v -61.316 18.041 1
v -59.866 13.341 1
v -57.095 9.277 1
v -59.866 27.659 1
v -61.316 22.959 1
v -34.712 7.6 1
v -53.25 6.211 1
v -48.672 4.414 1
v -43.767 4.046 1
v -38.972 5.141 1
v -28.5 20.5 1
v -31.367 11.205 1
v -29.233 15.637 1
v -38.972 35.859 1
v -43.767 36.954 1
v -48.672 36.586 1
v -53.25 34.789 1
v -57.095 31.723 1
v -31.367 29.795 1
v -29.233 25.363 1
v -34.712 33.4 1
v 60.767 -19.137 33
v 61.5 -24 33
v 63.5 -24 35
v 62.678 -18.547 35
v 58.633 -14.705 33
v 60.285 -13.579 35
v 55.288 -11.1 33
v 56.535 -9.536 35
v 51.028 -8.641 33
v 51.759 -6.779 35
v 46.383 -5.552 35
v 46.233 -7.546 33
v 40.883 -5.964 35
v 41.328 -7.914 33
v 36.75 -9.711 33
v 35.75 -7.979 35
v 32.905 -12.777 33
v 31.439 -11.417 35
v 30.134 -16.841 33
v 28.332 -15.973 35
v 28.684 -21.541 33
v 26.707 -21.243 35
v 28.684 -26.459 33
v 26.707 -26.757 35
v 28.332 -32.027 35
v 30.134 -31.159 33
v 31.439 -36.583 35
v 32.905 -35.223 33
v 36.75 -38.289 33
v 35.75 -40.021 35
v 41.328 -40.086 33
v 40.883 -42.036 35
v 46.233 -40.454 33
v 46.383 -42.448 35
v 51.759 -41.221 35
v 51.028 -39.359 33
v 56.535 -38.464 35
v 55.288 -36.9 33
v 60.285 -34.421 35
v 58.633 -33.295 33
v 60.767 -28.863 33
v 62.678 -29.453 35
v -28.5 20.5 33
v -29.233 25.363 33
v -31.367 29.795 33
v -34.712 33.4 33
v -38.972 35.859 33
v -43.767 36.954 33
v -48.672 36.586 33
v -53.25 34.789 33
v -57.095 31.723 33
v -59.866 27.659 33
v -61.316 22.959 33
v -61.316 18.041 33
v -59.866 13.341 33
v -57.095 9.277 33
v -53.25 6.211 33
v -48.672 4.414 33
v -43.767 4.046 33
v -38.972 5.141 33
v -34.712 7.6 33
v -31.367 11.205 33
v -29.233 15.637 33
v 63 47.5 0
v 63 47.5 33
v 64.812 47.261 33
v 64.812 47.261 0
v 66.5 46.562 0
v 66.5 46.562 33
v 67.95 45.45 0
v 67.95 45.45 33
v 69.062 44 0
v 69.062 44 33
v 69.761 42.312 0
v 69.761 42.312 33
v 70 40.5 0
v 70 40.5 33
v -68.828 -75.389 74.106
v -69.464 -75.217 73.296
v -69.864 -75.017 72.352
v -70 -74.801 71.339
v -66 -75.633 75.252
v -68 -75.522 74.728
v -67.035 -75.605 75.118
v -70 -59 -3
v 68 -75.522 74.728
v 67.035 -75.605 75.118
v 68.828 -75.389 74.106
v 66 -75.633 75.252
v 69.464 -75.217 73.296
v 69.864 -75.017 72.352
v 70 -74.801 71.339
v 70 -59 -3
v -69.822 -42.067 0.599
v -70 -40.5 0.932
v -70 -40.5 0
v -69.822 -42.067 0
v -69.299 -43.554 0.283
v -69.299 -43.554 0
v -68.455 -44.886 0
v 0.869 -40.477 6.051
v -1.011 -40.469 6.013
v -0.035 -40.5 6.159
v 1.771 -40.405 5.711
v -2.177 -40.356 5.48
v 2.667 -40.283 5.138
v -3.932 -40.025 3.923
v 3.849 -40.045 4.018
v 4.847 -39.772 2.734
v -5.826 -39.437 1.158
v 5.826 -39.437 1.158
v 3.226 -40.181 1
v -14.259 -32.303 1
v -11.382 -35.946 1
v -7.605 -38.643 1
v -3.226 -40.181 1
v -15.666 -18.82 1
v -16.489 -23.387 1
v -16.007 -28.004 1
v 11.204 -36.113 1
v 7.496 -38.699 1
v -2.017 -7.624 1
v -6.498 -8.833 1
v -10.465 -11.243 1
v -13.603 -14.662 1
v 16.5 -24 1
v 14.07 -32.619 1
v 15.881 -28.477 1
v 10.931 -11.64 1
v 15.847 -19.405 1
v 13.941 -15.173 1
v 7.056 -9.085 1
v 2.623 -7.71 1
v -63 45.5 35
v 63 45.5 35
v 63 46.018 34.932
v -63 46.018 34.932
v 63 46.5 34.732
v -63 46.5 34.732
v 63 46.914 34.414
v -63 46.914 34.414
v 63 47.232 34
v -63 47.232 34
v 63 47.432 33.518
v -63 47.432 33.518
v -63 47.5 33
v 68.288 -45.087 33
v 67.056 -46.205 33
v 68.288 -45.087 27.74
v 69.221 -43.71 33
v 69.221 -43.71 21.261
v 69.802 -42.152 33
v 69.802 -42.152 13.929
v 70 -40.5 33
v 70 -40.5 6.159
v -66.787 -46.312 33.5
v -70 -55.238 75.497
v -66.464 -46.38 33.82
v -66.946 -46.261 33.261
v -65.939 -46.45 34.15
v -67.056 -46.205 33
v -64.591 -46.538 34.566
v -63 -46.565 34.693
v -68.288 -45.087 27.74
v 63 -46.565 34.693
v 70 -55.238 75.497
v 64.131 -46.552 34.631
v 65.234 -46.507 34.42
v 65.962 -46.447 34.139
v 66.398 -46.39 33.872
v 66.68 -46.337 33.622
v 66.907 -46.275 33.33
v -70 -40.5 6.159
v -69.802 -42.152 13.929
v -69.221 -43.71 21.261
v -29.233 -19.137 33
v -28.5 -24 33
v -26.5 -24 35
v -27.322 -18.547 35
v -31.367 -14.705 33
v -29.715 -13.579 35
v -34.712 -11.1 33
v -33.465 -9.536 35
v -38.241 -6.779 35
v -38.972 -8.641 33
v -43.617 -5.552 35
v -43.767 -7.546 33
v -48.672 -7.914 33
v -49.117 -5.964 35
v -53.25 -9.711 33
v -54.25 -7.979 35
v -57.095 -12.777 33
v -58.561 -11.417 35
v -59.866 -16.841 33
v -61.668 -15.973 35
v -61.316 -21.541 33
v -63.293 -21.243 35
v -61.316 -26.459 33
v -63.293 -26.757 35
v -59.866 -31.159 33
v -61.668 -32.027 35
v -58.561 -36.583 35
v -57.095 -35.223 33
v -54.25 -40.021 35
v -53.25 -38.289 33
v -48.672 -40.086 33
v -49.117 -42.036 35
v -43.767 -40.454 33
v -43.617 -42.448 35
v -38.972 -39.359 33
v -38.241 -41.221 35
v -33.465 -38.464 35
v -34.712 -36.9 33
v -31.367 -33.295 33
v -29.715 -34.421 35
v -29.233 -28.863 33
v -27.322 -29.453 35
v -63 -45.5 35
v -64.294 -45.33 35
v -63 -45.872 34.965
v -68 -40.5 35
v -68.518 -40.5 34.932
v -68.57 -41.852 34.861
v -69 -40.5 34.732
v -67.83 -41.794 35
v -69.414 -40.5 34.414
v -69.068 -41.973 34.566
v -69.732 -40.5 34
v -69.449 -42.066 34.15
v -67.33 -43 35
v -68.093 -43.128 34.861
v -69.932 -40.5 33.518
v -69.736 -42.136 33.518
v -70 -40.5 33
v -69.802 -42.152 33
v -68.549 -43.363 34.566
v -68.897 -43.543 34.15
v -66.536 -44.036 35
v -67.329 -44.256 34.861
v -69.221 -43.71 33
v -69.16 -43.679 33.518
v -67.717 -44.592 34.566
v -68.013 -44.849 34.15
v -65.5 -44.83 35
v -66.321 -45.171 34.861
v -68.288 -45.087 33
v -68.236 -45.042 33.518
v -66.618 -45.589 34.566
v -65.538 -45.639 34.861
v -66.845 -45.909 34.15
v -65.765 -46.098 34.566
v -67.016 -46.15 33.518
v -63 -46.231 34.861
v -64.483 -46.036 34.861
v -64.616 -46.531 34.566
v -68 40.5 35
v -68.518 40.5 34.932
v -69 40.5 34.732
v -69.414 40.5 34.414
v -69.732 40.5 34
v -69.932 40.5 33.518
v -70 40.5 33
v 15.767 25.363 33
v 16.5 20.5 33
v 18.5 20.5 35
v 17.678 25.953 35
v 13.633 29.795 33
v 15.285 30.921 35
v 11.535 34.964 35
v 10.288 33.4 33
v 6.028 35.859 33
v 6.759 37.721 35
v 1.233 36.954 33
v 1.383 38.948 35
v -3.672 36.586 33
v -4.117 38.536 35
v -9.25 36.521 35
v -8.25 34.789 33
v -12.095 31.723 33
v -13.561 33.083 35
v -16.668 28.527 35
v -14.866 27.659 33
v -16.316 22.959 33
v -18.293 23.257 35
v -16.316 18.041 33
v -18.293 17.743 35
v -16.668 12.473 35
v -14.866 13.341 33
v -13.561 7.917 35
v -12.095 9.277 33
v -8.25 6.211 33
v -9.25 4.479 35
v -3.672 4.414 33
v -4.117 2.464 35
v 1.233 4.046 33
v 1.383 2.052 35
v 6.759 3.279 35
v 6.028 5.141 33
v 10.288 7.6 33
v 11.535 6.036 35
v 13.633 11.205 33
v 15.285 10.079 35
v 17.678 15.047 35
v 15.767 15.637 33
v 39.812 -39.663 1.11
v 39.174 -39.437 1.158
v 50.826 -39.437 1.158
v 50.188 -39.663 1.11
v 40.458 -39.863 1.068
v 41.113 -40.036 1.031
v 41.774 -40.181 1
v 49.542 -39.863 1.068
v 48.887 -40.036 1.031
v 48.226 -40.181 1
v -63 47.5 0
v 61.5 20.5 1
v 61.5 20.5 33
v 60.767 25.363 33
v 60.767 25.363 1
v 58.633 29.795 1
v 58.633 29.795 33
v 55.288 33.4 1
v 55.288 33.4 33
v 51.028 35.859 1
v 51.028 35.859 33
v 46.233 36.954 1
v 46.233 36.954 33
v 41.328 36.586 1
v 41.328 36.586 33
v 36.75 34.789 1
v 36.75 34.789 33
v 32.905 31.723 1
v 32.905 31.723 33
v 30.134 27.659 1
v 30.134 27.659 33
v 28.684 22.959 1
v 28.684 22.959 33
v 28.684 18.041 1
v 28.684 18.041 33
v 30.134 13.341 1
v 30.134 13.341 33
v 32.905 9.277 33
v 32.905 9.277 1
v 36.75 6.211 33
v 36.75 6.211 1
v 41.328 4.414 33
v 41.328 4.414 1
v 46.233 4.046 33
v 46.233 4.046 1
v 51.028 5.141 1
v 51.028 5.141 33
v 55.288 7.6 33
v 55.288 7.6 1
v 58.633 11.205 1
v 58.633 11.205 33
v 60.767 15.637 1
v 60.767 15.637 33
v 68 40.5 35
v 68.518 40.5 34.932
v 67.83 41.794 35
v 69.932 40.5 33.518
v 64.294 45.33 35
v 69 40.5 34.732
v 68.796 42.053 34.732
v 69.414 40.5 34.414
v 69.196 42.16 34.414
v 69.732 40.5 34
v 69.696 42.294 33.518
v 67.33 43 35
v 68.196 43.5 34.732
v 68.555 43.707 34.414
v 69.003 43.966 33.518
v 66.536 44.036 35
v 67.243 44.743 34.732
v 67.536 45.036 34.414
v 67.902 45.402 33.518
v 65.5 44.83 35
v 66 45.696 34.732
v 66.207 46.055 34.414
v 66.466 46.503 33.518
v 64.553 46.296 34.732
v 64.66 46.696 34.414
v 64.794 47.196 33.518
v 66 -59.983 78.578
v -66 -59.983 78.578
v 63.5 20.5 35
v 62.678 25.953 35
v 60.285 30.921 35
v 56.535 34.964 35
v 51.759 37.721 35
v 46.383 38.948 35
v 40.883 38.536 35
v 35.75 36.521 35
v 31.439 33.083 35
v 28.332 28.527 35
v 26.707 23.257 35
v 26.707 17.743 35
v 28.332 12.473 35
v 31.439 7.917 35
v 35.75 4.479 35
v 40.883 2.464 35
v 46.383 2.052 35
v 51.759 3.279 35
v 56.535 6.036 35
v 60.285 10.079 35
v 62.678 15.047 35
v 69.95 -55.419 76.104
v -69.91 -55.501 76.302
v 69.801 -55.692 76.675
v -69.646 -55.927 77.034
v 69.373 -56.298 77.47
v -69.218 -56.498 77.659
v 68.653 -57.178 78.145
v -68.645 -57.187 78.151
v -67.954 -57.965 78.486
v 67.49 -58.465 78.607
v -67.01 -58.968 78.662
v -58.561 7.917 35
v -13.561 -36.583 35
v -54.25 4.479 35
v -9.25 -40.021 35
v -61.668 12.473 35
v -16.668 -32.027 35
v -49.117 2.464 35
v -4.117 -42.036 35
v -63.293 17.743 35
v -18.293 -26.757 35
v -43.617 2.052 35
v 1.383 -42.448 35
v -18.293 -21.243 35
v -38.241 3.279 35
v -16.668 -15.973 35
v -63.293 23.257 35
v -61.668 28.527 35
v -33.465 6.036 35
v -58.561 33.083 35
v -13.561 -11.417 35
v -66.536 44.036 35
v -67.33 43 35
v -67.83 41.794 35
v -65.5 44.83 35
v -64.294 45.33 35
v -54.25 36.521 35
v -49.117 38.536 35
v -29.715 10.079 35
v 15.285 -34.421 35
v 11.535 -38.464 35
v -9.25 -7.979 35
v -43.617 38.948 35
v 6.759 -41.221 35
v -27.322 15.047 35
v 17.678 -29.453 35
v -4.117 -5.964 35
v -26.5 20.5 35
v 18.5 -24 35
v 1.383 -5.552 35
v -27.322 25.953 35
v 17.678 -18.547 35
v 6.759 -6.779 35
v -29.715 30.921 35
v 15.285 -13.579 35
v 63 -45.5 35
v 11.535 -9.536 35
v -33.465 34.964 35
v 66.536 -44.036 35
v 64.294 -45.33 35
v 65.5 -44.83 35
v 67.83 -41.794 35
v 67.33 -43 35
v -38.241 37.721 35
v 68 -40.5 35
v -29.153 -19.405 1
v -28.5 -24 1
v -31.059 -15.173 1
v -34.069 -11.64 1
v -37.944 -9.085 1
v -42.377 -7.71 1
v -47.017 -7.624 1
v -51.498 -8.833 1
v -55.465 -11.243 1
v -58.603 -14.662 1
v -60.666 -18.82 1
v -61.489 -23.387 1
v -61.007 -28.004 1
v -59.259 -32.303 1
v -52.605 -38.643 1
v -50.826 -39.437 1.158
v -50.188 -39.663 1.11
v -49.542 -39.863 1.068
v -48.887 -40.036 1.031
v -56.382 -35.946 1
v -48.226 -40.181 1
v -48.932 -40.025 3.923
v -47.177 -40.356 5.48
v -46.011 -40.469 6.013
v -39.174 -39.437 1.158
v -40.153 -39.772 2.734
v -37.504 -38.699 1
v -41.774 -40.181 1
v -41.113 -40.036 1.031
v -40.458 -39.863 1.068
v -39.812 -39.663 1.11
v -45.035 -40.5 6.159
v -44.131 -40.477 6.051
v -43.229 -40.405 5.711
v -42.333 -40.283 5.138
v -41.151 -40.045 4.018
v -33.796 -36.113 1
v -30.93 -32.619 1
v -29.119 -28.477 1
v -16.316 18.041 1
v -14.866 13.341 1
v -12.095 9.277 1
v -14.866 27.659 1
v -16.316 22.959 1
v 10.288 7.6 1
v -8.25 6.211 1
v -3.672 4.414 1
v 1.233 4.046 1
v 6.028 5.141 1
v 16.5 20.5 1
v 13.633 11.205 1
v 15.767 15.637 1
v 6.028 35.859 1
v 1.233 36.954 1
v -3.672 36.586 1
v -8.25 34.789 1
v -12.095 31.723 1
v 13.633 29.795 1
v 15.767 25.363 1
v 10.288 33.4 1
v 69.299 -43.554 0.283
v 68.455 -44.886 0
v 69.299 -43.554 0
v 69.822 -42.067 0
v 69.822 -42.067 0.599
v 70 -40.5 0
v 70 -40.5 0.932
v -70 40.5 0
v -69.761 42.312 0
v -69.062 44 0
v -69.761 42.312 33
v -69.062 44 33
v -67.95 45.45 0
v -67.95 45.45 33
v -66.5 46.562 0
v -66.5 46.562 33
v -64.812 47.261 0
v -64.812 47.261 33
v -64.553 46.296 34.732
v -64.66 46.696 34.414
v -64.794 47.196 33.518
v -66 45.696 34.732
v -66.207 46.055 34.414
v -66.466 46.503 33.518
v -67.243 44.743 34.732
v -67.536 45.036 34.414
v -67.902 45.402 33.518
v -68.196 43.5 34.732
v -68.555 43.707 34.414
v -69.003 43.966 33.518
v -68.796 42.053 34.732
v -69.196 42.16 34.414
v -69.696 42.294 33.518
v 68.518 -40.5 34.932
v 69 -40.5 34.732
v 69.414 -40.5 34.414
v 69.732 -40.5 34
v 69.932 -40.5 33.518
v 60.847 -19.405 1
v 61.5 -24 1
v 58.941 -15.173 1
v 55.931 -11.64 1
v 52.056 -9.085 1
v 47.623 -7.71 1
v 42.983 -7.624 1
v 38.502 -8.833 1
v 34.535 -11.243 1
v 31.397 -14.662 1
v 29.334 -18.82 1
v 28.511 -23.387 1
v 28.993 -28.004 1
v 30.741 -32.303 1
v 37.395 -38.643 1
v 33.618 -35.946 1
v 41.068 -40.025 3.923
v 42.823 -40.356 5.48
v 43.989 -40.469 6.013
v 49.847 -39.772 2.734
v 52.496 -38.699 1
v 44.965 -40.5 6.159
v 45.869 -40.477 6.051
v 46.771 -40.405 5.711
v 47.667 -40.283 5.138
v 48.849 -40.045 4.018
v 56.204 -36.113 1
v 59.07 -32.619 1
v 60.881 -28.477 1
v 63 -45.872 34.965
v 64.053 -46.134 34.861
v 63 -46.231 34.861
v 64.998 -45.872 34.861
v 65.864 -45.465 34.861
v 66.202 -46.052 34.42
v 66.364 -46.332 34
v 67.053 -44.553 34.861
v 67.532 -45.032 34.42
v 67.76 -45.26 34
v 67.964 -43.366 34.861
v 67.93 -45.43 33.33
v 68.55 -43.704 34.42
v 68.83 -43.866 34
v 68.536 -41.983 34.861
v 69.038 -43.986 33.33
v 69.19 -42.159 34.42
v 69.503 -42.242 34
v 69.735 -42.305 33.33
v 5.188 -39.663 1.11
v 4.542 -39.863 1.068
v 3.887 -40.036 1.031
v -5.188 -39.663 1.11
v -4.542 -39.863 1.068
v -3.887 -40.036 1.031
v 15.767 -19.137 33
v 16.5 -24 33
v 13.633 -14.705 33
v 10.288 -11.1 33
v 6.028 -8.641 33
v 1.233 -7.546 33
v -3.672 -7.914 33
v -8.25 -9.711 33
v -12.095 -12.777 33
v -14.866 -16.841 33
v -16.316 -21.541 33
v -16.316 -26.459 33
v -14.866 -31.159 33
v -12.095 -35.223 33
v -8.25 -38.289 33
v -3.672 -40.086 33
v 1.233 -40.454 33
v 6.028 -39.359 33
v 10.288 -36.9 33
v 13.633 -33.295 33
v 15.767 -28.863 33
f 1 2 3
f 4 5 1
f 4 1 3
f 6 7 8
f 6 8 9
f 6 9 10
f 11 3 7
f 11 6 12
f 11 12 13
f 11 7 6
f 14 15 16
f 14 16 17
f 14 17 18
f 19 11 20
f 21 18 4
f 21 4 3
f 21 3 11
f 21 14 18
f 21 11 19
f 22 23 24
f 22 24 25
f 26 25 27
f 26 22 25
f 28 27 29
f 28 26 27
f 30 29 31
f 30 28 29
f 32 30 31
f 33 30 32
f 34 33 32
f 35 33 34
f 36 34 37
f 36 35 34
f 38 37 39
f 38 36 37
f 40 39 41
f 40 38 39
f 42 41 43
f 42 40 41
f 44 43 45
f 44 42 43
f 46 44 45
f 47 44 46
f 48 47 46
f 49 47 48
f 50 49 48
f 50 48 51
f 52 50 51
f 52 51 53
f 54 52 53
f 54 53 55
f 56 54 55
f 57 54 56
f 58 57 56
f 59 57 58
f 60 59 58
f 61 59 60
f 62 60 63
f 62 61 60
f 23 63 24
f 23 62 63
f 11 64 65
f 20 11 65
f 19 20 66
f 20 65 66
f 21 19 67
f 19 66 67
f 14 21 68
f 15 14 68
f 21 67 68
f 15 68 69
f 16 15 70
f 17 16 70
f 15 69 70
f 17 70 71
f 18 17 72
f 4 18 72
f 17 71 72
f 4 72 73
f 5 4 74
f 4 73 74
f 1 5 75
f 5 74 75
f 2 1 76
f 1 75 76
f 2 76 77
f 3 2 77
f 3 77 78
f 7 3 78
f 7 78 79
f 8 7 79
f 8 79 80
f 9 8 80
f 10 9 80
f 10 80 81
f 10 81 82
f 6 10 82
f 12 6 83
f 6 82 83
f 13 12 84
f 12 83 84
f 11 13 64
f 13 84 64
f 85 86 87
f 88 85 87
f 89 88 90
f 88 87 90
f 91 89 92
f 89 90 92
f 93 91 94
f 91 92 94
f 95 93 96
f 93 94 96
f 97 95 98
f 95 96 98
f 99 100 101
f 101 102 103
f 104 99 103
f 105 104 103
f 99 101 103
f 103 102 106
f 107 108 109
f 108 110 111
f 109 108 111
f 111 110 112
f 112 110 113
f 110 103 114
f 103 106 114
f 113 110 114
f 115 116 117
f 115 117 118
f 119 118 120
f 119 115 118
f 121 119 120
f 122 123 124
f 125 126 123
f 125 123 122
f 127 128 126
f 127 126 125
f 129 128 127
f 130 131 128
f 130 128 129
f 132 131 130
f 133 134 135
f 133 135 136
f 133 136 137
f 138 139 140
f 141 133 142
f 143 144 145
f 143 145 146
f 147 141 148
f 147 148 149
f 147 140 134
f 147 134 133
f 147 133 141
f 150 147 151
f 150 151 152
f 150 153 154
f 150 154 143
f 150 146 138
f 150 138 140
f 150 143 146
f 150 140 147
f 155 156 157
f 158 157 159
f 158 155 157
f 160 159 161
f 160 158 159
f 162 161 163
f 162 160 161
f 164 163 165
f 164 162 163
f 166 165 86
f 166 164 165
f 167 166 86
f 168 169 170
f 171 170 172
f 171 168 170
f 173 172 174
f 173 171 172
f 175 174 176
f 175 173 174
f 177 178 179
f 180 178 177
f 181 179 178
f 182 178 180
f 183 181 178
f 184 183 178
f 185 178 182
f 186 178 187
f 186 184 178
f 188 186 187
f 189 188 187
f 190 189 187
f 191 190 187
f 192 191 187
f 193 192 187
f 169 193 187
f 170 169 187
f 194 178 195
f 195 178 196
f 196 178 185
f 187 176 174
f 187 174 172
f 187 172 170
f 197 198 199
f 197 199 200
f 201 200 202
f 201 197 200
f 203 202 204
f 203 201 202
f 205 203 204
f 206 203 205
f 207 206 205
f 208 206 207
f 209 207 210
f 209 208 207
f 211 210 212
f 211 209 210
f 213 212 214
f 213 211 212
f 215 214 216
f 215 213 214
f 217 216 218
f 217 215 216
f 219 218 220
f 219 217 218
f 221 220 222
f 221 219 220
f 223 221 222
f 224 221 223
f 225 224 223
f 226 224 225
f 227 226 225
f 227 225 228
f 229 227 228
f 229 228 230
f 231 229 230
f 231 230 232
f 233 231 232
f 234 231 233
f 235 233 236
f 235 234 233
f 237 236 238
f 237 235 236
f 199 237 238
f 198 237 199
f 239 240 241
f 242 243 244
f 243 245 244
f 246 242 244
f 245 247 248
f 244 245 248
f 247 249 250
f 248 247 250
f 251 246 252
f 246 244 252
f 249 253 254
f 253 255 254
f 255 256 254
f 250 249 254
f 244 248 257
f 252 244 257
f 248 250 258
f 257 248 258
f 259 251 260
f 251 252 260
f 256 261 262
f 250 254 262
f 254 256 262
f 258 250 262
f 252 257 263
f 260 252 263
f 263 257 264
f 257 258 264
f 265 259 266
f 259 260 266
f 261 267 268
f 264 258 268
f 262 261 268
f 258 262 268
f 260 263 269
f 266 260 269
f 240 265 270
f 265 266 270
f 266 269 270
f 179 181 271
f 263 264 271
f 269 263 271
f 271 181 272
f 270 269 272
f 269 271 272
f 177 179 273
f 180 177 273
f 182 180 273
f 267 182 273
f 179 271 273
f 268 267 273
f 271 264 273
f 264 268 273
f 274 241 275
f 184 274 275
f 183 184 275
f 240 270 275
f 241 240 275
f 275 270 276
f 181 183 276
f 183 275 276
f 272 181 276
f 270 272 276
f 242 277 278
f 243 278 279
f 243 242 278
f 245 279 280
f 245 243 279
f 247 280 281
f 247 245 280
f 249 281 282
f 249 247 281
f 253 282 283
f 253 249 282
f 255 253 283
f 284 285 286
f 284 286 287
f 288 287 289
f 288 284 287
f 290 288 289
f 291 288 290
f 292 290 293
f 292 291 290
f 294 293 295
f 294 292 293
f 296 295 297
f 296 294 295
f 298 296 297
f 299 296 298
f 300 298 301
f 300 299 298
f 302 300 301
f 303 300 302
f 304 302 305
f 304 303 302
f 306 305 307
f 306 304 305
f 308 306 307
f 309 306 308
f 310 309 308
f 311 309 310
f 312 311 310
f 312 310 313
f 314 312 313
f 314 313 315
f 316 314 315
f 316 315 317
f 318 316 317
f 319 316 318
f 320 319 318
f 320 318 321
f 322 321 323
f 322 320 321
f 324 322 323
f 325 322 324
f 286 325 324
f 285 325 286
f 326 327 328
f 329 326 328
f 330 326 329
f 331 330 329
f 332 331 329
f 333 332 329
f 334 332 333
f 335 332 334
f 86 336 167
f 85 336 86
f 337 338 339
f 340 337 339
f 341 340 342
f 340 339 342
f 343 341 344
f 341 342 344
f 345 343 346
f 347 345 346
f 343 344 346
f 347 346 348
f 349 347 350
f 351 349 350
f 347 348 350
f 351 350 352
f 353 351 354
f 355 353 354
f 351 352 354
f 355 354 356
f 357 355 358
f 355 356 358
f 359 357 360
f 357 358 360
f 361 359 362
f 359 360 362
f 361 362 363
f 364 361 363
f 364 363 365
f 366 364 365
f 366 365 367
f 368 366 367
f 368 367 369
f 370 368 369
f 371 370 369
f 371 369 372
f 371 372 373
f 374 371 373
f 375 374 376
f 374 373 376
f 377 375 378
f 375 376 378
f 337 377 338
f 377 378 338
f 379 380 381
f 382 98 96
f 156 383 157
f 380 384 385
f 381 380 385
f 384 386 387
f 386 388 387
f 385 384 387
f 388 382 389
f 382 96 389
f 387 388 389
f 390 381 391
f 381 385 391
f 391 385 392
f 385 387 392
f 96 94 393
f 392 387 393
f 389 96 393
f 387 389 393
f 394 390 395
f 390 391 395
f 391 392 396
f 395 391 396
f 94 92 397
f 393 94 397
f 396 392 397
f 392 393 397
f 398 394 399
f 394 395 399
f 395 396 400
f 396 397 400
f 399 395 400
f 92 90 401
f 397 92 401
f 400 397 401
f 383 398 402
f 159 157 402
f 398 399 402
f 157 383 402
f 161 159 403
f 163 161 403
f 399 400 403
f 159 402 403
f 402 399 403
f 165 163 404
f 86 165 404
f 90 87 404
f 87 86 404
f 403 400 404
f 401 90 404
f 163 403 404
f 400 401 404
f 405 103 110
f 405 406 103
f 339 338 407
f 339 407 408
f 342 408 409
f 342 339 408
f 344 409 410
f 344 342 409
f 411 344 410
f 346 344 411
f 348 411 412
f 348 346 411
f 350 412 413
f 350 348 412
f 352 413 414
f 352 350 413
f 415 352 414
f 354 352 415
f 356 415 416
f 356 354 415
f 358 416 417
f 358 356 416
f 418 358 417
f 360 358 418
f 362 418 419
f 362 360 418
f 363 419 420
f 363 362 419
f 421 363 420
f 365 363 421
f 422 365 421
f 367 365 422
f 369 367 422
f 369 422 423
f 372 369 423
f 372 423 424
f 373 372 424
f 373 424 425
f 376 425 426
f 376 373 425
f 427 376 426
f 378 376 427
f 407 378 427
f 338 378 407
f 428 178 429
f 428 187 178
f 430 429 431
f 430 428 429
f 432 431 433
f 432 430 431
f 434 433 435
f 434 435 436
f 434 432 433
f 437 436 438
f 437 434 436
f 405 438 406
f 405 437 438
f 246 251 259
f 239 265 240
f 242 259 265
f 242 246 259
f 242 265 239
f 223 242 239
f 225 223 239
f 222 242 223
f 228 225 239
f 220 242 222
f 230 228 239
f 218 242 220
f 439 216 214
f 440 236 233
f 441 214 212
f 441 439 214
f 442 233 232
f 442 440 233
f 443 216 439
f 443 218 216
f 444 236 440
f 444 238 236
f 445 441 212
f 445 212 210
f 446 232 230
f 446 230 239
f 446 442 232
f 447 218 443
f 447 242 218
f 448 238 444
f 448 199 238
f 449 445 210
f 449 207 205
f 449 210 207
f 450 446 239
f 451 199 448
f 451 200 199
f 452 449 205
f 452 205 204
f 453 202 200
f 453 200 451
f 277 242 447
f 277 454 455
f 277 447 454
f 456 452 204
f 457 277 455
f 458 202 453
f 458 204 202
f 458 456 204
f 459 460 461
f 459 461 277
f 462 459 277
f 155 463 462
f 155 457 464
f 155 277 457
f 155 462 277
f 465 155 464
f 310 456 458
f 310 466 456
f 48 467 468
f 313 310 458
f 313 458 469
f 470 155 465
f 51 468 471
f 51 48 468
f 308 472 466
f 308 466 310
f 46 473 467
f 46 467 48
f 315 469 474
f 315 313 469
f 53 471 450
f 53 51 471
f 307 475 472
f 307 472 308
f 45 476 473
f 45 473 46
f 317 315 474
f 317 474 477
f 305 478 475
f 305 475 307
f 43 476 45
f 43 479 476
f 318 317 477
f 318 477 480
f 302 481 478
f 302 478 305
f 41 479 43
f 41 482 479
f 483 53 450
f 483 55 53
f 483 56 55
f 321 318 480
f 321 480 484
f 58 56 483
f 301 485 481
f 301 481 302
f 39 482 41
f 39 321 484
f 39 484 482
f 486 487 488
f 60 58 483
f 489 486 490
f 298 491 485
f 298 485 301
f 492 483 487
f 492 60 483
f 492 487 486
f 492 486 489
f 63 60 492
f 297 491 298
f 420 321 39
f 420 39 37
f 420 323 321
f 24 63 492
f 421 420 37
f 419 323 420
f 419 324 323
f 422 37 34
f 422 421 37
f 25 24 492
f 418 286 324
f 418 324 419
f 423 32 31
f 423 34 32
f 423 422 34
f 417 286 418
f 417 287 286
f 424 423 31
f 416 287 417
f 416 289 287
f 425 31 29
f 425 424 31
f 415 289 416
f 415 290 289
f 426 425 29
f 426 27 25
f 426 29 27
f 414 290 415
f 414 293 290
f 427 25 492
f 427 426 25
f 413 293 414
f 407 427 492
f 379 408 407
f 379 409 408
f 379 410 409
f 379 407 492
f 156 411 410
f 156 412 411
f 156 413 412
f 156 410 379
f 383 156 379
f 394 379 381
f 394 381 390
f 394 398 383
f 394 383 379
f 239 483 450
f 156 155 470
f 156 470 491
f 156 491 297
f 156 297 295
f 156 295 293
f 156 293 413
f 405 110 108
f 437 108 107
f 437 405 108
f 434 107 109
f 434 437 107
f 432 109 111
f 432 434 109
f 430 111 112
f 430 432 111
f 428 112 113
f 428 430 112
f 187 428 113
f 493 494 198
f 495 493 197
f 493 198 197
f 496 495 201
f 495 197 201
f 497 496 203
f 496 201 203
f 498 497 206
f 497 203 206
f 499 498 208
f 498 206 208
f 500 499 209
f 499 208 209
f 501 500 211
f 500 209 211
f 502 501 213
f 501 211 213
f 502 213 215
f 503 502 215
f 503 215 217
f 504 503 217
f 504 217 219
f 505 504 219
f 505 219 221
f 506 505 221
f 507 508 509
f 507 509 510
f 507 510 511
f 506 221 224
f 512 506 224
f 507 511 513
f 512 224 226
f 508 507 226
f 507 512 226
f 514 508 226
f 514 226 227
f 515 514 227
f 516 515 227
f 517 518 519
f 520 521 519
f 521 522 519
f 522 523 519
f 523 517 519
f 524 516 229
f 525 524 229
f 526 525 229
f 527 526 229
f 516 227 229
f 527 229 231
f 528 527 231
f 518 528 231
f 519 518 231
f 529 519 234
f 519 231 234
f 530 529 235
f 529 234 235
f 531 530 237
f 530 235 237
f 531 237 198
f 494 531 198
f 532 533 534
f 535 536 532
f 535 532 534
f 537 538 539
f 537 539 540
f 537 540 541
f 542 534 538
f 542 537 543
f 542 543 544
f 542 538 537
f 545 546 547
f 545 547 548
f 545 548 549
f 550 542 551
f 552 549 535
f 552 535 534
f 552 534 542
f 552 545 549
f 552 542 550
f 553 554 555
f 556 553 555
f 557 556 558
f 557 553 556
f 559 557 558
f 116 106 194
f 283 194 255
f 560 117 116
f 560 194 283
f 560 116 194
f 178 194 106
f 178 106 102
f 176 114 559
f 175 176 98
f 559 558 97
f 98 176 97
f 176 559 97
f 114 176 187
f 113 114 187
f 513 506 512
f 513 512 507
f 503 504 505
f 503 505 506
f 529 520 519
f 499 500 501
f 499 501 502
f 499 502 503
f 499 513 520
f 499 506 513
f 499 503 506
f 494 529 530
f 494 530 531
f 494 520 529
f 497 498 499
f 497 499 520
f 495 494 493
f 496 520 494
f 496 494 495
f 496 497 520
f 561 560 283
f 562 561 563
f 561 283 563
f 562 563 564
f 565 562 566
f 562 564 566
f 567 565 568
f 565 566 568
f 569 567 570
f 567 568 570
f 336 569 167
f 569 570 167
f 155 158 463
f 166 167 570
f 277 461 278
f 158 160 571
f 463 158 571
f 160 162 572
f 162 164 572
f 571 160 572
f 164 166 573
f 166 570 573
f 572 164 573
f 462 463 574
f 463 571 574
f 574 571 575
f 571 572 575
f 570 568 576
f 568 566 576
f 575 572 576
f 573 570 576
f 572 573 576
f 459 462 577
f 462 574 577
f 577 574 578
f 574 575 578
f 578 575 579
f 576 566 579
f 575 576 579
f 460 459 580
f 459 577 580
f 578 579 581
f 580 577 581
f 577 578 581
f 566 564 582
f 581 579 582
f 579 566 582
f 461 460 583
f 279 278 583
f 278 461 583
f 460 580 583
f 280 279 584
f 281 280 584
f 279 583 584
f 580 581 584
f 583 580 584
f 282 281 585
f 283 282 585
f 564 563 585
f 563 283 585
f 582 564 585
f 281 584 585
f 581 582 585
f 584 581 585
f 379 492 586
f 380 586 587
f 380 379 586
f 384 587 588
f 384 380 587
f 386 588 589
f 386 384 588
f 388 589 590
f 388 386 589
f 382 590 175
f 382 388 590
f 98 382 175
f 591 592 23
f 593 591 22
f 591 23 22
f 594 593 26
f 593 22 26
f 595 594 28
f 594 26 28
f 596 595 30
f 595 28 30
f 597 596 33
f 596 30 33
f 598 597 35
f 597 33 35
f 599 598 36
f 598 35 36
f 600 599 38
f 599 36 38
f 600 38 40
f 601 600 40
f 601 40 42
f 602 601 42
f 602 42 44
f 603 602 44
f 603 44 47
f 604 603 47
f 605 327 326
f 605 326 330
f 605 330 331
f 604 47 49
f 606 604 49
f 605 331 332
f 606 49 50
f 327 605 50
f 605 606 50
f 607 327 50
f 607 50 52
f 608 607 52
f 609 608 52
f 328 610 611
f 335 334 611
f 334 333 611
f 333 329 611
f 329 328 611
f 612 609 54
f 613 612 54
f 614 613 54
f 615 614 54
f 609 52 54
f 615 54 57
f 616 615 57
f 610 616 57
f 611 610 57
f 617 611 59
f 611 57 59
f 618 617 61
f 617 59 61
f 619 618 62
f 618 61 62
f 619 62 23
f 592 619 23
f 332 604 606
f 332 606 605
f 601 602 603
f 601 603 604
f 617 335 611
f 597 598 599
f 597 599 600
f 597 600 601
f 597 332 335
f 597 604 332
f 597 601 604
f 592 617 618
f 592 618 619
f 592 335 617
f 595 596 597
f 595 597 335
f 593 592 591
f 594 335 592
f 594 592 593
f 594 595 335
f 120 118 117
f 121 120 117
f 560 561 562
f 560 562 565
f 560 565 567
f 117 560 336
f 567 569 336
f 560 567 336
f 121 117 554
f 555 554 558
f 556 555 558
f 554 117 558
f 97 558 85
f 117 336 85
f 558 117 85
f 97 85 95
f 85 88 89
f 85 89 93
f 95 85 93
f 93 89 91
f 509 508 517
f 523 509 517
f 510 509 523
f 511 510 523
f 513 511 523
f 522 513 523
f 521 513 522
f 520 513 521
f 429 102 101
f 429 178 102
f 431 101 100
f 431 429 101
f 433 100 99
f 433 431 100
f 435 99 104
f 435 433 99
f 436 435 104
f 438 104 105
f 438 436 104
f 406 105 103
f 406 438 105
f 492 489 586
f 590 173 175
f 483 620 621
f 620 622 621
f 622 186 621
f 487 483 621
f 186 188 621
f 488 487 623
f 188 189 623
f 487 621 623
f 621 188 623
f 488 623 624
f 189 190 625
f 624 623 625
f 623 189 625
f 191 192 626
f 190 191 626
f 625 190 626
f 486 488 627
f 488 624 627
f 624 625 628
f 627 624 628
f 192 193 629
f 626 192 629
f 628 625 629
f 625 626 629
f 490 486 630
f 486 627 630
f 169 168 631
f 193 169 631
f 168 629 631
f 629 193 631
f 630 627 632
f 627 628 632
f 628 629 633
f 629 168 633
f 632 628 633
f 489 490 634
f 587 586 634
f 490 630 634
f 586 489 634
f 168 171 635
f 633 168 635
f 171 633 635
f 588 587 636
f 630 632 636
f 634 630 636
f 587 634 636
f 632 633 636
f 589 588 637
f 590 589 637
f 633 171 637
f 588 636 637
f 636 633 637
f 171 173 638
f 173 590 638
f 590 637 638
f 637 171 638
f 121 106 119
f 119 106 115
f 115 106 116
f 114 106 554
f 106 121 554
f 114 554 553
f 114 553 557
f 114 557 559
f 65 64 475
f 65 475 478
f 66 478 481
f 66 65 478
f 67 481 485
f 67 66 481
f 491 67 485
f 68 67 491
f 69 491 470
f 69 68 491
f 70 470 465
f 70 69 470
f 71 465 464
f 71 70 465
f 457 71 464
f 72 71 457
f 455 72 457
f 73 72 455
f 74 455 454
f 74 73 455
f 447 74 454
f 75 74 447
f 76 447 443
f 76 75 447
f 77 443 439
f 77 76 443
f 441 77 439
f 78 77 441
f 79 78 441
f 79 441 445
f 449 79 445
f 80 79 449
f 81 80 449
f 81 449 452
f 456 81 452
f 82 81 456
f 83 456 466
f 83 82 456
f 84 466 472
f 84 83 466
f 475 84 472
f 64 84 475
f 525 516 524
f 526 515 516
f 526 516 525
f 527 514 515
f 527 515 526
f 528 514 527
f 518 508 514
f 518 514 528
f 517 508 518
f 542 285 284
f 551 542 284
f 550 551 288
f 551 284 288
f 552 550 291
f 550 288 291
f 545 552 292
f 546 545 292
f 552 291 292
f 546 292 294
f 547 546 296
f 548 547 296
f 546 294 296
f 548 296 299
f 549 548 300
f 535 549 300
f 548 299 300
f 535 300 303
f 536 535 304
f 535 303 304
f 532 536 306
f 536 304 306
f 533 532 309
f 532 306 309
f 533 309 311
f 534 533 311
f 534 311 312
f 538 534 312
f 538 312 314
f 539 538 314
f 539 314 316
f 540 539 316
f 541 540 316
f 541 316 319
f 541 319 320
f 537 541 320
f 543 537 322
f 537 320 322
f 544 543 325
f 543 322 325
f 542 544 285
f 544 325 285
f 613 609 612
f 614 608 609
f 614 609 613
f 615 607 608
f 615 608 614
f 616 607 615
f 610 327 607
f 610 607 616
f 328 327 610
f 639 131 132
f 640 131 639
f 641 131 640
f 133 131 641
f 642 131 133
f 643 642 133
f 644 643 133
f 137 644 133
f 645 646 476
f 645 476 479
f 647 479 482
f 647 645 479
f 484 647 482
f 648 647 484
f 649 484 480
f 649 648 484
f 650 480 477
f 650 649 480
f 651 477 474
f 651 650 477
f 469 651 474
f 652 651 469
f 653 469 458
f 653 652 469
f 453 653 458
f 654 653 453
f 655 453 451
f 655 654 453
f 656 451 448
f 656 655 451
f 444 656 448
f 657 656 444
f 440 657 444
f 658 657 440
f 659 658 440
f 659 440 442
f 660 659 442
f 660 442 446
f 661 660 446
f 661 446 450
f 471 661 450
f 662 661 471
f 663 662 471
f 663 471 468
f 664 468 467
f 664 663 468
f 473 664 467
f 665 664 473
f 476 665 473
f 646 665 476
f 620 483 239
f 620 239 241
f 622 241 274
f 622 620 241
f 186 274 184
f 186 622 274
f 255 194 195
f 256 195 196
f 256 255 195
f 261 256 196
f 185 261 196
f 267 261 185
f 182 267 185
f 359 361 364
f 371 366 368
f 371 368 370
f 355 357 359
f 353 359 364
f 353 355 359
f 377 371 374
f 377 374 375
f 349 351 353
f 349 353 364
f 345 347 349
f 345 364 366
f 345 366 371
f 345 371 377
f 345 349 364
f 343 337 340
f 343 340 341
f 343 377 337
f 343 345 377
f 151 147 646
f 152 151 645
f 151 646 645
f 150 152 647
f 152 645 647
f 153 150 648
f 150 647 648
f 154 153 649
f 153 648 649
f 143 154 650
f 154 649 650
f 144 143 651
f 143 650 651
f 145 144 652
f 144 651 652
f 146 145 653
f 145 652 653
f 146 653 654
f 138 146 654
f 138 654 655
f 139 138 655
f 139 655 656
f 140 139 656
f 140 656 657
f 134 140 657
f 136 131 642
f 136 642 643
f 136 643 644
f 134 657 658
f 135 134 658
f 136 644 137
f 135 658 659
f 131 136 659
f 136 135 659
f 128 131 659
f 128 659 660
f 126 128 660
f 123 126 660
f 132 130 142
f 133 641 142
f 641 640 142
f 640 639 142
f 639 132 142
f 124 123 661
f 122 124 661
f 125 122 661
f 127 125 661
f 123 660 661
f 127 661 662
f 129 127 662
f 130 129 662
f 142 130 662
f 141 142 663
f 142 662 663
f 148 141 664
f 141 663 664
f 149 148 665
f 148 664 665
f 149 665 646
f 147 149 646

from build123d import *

# Parameters (mm, degrees)
BOX_W          = 140
BOX_H          = 20
BOX_DEPTH      = 80
BOX_ROLL_ANGLE = 12
SKETCH_W       = 140
SKETCH_H       = 95
PAD_DEPTH      = 35
SKETCH001_R    = 16.5
POCKET_DEPTH   = 34
FILLET_R       = 7
FILLET001_R    = 2
CHAMFER_SIZE   = 2
FILLET002_R    = 4


with BuildPart() as cube:
    # Box → Box (new body)
    with BuildSketch(Plane.XY):
        with Locations((70, 10)):
            Rectangle(BOX_W, BOX_H)
    extrude(amount=BOX_DEPTH)


with BuildPart() as cube_1:
    # Box roll: moved
    add(cube.part.rotate(Axis((0, 0, 0), (1, 0, 0)), BOX_ROLL_ANGLE))


with BuildPart() as cube_2:
    # Box placement: moved
    add(cube_1.part.moved(Location((-70, -59, -3))))


with BuildPart() as fillet002:
    # Sketch → Pad (new body)
    with BuildSketch(Plane.XY):
        Rectangle(SKETCH_W, SKETCH_H)
    extrude(amount=PAD_DEPTH)

    # Sketch001 → Pocket (cut)
    with BuildSketch(Plane.XY.offset(35)):
        with Locations((-45, 20.5)):
            Circle(SKETCH001_R)
        with Locations((0, 20.5)):
            Circle(SKETCH001_R)
        with Locations((45, 20.5)):
            Circle(SKETCH001_R)
        with Locations((45, -24)):
            Circle(SKETCH001_R)
        with Locations((0, -24)):
            Circle(SKETCH001_R)
        with Locations((-45, -24)):
            Circle(SKETCH001_R)
    extrude(amount=-POCKET_DEPTH, mode=Mode.SUBTRACT)

    # Fillet
    fillet_edges = [fillet002.edges().sort_by_distance(p)[0] for p in [
        (-70, -47.5, 17.5),
        (70, -47.5, 17.5),
        (70, 47.5, 17.5),
        (-70, 47.5, 17.5),
    ]]
    fillet(fillet_edges, radius=FILLET_R)

    # Fillet001
    fillet001_edges = [fillet002.edges().sort_by_distance(p)[0] for p in [
        (0, -47.5, 35),
        (-70, 0, 35),
        (0, 47.5, 35),
        (70, 0, 35),
    ]]
    fillet(fillet001_edges, radius=FILLET001_R)

    # Chamfer
    chamfer_edges = [fillet002.edges().sort_by_distance(p)[0] for p in [
        (-61.5, -24, 35),
        (-61.5, 20.5, 35),
        (-16.5, 20.5, 35),
        (-16.5, -24, 35),
        (28.5, 20.5, 35),
        (28.5, -24, 35),
    ]]
    chamfer(chamfer_edges, length=CHAMFER_SIZE)

    # Fusion: union Cube
    add(cube_2.part)

    # Fillet002
    fillet002_edges = [fillet002.edges().sort_by_distance(p)[0] for p in [
        (70, -65.851459, 77.330925),
        (-70, -65.851459, 77.330925),
        (0, -56.069983, 79.410042),
    ]]
    fillet(fillet002_edges, radius=FILLET002_R)


solid = fillet002.part
